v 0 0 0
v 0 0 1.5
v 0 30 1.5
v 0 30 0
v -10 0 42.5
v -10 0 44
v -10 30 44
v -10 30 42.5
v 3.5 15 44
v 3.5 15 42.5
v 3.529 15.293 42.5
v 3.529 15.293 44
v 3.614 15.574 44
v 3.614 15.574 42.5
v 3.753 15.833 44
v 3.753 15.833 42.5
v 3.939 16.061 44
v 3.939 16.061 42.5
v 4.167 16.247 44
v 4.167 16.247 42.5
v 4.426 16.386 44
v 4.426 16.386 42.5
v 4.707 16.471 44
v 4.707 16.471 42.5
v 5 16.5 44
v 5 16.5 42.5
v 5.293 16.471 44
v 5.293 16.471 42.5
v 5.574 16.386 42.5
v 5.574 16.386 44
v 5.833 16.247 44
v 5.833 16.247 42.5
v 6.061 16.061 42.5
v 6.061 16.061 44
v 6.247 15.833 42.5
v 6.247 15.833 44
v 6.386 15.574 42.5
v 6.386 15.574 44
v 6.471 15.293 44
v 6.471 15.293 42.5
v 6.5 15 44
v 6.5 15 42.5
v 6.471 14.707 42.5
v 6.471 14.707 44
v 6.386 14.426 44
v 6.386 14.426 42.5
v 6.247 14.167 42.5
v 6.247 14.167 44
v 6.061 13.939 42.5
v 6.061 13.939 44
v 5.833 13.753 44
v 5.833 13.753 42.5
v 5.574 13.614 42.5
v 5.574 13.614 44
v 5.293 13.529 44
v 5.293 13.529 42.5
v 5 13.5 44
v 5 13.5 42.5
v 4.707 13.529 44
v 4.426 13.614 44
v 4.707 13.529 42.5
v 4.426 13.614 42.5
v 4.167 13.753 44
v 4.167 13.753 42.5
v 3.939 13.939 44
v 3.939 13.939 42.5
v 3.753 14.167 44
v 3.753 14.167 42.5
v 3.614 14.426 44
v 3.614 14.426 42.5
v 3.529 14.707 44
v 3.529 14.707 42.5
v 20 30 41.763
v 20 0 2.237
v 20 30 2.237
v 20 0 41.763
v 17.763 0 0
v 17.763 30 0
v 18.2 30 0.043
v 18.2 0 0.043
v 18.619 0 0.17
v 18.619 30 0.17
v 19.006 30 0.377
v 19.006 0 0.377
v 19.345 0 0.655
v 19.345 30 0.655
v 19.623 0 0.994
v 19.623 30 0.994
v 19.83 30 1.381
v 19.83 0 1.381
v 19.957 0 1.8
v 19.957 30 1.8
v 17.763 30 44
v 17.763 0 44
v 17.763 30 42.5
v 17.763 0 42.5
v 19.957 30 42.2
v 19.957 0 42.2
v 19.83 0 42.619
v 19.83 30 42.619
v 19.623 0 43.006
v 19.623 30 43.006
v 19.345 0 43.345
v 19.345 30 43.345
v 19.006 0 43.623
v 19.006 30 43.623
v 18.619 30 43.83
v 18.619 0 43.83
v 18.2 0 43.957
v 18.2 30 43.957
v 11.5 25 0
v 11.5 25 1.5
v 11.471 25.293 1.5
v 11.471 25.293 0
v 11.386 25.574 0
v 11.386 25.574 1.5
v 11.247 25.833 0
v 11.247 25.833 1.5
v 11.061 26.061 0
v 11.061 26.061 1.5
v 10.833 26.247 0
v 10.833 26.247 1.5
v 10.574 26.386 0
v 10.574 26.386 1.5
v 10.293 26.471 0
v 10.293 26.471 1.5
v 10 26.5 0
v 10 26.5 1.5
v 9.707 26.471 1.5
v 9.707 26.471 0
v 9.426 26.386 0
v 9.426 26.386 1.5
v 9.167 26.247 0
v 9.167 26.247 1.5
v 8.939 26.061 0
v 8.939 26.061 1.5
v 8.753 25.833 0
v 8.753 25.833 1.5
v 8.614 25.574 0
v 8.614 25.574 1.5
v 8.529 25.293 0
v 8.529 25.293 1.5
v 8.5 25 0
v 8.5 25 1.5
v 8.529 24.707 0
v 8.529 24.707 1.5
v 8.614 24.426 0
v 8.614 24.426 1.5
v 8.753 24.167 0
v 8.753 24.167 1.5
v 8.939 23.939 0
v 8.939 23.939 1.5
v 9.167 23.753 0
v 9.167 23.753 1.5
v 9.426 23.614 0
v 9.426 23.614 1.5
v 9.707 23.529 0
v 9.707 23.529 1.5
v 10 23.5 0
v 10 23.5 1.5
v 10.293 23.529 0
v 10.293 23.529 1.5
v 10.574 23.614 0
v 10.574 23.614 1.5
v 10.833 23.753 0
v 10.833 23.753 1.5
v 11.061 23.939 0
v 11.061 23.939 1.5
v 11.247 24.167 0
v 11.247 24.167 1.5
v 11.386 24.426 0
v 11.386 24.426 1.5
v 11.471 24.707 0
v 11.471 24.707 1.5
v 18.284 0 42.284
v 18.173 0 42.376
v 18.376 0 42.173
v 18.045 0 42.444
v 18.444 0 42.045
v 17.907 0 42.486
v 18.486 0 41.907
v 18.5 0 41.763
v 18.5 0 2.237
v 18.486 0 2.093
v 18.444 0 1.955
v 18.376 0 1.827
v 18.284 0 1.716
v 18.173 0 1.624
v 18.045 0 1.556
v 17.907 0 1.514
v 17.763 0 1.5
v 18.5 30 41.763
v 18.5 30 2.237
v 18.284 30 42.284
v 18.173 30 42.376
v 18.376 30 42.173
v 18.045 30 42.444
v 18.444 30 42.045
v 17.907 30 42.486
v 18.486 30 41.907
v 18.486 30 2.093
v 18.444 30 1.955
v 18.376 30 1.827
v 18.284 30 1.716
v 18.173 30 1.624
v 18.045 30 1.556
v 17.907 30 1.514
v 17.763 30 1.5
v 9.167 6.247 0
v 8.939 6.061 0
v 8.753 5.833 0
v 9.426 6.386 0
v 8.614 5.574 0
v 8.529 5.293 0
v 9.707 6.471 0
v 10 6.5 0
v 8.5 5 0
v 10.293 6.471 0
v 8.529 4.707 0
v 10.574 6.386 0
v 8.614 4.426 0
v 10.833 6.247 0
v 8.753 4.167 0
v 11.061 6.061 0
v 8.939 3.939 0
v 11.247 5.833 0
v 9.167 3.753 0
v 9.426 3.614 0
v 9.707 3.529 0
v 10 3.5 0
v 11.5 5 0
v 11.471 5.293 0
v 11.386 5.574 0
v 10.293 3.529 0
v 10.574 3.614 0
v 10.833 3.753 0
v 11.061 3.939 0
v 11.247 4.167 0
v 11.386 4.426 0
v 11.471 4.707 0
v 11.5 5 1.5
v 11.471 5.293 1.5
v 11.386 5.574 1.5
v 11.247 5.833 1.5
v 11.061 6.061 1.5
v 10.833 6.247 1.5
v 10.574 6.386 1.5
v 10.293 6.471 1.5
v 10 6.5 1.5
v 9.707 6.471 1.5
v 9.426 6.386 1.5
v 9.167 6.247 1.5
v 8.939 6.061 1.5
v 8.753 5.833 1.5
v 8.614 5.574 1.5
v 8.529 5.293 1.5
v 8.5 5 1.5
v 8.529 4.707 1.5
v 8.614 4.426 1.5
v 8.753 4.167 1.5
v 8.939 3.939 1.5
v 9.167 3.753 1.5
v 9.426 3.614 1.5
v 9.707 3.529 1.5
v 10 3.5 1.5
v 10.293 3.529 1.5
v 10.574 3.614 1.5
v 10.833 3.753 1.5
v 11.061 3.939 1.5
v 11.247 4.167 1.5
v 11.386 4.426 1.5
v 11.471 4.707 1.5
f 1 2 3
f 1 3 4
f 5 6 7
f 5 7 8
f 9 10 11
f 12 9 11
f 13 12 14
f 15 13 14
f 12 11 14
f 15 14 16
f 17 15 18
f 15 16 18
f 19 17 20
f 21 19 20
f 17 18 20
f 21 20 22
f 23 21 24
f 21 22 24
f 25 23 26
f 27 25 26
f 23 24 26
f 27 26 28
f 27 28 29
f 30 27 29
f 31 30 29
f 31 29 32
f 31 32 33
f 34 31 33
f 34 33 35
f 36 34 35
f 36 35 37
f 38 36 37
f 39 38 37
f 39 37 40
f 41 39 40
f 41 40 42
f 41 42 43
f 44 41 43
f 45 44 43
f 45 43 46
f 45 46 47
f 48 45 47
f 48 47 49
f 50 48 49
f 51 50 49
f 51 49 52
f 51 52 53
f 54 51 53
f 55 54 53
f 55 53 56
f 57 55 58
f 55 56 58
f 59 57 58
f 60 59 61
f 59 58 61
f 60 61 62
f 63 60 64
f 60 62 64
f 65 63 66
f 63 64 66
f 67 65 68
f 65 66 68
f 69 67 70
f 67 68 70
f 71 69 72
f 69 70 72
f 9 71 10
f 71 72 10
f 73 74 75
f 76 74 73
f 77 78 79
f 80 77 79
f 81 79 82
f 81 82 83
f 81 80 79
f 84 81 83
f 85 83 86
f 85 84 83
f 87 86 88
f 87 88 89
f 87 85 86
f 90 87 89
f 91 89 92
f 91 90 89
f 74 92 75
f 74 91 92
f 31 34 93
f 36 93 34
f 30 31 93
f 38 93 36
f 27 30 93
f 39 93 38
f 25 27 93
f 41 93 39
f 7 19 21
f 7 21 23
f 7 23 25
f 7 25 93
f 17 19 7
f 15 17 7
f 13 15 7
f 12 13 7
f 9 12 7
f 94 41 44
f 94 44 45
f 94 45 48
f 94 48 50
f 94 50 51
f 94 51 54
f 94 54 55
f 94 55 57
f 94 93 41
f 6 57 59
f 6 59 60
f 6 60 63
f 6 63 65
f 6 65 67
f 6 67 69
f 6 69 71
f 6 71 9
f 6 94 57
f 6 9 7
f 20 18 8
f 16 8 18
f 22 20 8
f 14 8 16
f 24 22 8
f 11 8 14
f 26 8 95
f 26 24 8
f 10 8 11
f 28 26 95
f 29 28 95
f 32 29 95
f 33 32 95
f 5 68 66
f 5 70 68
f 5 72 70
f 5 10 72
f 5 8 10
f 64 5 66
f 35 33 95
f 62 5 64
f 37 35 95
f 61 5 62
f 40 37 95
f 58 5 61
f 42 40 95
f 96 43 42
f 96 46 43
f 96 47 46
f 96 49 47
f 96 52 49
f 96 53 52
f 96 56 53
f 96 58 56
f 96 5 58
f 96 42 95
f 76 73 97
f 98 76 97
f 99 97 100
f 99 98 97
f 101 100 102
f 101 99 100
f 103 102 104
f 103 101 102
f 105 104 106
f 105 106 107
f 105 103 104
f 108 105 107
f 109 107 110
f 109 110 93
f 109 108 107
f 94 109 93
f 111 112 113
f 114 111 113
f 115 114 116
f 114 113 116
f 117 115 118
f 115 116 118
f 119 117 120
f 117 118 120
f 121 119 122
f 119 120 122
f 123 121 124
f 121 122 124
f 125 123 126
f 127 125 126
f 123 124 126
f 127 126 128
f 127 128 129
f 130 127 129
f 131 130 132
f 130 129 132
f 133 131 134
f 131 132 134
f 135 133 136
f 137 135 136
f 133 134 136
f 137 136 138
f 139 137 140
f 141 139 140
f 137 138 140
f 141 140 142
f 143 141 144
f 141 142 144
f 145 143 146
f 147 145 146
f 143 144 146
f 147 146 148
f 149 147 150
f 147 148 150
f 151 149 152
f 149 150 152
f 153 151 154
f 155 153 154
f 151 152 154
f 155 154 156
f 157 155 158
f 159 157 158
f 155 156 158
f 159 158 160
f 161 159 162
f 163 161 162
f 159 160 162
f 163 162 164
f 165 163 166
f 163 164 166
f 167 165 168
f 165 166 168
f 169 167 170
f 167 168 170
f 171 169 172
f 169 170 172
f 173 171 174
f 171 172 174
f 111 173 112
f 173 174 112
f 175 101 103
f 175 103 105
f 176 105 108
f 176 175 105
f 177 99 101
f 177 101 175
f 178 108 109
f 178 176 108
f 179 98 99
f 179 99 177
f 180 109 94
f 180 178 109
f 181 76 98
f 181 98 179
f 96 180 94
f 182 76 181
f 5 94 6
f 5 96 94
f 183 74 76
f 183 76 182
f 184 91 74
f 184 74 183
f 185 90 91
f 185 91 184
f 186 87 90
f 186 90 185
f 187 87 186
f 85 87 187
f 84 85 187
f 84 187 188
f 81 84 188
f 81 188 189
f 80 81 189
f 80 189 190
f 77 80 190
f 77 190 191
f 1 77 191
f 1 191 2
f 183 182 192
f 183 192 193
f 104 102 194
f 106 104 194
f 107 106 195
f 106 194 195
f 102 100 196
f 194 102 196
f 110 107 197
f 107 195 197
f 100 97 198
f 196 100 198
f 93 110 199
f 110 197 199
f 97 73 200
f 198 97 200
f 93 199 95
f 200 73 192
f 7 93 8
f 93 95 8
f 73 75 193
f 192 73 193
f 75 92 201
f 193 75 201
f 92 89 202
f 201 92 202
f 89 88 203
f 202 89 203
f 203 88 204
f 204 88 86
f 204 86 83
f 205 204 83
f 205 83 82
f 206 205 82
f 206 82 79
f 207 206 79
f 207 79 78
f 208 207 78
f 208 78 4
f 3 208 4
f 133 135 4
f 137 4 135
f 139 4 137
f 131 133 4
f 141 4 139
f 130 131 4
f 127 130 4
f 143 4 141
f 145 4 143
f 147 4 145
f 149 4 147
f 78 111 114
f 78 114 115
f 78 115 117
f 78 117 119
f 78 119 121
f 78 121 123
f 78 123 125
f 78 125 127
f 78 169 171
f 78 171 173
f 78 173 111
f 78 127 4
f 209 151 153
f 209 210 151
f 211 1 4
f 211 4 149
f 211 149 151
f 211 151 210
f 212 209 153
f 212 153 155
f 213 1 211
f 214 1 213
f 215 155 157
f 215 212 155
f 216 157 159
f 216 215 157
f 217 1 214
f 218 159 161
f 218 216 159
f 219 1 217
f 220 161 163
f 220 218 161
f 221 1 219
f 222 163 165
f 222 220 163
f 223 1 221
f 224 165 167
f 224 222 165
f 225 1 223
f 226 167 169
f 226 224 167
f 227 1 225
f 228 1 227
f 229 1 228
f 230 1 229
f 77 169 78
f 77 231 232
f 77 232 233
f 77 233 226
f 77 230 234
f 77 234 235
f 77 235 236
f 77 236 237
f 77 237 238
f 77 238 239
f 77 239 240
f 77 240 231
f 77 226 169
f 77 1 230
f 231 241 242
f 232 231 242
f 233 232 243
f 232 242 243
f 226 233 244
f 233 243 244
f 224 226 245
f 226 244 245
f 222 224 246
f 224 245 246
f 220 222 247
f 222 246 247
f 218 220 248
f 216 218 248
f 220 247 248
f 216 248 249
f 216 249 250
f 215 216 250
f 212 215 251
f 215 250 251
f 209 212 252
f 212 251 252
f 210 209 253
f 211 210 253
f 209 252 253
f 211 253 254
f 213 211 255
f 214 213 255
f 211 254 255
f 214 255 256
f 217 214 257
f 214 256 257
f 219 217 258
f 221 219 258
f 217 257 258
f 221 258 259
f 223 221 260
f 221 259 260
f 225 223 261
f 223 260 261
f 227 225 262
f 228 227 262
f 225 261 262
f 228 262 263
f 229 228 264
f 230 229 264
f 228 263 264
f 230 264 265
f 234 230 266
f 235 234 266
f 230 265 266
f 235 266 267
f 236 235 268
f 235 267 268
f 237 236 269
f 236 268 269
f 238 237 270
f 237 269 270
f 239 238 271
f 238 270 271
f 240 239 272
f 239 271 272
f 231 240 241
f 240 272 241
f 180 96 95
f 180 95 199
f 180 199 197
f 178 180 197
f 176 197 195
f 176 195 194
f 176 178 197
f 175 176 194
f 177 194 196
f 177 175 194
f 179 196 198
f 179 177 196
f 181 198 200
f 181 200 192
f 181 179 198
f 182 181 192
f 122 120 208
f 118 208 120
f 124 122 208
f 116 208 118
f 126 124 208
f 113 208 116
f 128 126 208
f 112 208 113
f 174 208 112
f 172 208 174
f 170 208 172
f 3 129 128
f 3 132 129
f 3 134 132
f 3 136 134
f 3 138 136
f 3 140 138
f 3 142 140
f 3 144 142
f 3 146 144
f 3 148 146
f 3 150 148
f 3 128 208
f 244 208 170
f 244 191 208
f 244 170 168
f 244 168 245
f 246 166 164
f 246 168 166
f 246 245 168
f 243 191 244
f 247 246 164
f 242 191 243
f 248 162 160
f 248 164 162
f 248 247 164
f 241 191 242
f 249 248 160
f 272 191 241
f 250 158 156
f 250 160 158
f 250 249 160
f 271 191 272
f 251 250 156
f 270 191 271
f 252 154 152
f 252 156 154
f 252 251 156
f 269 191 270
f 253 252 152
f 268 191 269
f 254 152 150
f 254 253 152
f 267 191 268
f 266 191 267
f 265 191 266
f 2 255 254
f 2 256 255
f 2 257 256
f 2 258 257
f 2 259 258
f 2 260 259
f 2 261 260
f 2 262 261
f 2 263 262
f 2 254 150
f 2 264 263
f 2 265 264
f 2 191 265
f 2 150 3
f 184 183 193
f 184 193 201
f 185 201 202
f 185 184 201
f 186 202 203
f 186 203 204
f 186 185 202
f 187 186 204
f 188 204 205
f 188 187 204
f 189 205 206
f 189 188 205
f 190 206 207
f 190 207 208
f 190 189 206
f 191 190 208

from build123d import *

# Parameters (mm, degrees)
BASE_FLANGE1_DEPTH                     = 30
F_3_0MM_TRANSITIONAL_DOWEL_HOLE1_D     = 3
F_3_0MM_TRANSITIONAL_DOWEL_HOLE1_DEPTH = 1.5
F_3_0MM_TRANSITIONAL_DOWEL_HOLE2_D     = 3
F_3_0MM_TRANSITIONAL_DOWEL_HOLE2_DEPTH = 1.5
F_3_0MM_PRESS_DOWEL_HOLE1_D            = 3
F_3_0MM_PRESS_DOWEL_HOLE1_DEPTH        = 6
F_3_0MM_PRESS_DOWEL_HOLE1_TIP          = 0.901290929


# Sheet-metal steps are written as plain solids
with BuildPart() as part:
    # Sketch1 → Base-Flange1 (new body)
    with BuildSketch(Plane(origin=(0, 0, 0), x_dir=(1, 0, 0), z_dir=(0, 1, 0))):
        with BuildLine():
            Line((0, 0), (17.7634, 0))
            ThreePointArc((17.7634, 0), (19.344915027, -0.655084973), (20, -2.2366))
            Line((20, -2.2366), (20, -41.7634))
            ThreePointArc((20, -41.7634), (19.344915027, -43.344915027), (17.7634, -44))
            Line((17.7634, -44), (-10, -44))
            Line((-10, -44), (-10, -42.5))
            Line((-10, -42.5), (17.7634, -42.5))
            ThreePointArc((17.7634, -42.5), (18.284254855, -42.284254855), (18.5, -41.7634))
            Line((18.5, -41.7634), (18.5, -2.2366))
            ThreePointArc((18.5, -2.2366), (18.284254855, -1.715745145), (17.7634, -1.5))
            Line((17.7634, -1.5), (0, -1.5))
            Line((0, -1.5), (0, 0))
        make_face()
    extrude(amount=BASE_FLANGE1_DEPTH)

    # Ø3.0mm Transitional Dowel Hole1
    with Locations(Plane(origin=(0, 0, 0), x_dir=(-1, 0, 0), z_dir=(0, 0, -1))):
        with Locations((-10, 25), (-10, 5)):
            Hole(F_3_0MM_TRANSITIONAL_DOWEL_HOLE1_D / 2, depth=F_3_0MM_TRANSITIONAL_DOWEL_HOLE1_DEPTH)

    # Ø3.0mm Transitional Dowel Hole2
    with Locations(Plane.XY.offset(44)):
        with Locations((5, 15)):
            Hole(F_3_0MM_TRANSITIONAL_DOWEL_HOLE2_D / 2, depth=F_3_0MM_TRANSITIONAL_DOWEL_HOLE2_DEPTH)

    # Ø3.0mm Press Dowel Hole1
    with Locations(Plane(origin=(146.531359221, 116.2862719, -6), x_dir=(0, -1, 0), z_dir=(0, 0, -1))):
        with Locations((220.525513363, 156.531359221), (102.525513363, 181.531359221), (102.525513363, 271.531359221), (89.19270005, 226.531359221), (210.525513363, 317.793651488), (230.525513363, 317.793651488), (252.525513363, 320.462332131), (232.525513363, 300.462332131), (252.525513363, 132.600386311), (232.525513363, 152.600386311), (111.286271896, 136.531359221), (91.286271896, 136.531359221), (41.525513363, 196.432813402), (13.525513363, 196.432813402), (41.525513363, 138.767959221), (13.525513363, 138.767959221), (41.525513363, 256.62990504), (13.525513363, 256.62990504), (41.525513363, 314.294759221), (13.525513363, 314.294759221)):
            Hole(F_3_0MM_PRESS_DOWEL_HOLE1_D / 2, depth=F_3_0MM_PRESS_DOWEL_HOLE1_DEPTH)
            with Locations((0, 0, -(F_3_0MM_PRESS_DOWEL_HOLE1_DEPTH + F_3_0MM_PRESS_DOWEL_HOLE1_TIP / 2))):  # 118° drill point
                Cone(0, F_3_0MM_PRESS_DOWEL_HOLE1_D / 2, F_3_0MM_PRESS_DOWEL_HOLE1_TIP, mode=Mode.SUBTRACT)


solid = part.part
